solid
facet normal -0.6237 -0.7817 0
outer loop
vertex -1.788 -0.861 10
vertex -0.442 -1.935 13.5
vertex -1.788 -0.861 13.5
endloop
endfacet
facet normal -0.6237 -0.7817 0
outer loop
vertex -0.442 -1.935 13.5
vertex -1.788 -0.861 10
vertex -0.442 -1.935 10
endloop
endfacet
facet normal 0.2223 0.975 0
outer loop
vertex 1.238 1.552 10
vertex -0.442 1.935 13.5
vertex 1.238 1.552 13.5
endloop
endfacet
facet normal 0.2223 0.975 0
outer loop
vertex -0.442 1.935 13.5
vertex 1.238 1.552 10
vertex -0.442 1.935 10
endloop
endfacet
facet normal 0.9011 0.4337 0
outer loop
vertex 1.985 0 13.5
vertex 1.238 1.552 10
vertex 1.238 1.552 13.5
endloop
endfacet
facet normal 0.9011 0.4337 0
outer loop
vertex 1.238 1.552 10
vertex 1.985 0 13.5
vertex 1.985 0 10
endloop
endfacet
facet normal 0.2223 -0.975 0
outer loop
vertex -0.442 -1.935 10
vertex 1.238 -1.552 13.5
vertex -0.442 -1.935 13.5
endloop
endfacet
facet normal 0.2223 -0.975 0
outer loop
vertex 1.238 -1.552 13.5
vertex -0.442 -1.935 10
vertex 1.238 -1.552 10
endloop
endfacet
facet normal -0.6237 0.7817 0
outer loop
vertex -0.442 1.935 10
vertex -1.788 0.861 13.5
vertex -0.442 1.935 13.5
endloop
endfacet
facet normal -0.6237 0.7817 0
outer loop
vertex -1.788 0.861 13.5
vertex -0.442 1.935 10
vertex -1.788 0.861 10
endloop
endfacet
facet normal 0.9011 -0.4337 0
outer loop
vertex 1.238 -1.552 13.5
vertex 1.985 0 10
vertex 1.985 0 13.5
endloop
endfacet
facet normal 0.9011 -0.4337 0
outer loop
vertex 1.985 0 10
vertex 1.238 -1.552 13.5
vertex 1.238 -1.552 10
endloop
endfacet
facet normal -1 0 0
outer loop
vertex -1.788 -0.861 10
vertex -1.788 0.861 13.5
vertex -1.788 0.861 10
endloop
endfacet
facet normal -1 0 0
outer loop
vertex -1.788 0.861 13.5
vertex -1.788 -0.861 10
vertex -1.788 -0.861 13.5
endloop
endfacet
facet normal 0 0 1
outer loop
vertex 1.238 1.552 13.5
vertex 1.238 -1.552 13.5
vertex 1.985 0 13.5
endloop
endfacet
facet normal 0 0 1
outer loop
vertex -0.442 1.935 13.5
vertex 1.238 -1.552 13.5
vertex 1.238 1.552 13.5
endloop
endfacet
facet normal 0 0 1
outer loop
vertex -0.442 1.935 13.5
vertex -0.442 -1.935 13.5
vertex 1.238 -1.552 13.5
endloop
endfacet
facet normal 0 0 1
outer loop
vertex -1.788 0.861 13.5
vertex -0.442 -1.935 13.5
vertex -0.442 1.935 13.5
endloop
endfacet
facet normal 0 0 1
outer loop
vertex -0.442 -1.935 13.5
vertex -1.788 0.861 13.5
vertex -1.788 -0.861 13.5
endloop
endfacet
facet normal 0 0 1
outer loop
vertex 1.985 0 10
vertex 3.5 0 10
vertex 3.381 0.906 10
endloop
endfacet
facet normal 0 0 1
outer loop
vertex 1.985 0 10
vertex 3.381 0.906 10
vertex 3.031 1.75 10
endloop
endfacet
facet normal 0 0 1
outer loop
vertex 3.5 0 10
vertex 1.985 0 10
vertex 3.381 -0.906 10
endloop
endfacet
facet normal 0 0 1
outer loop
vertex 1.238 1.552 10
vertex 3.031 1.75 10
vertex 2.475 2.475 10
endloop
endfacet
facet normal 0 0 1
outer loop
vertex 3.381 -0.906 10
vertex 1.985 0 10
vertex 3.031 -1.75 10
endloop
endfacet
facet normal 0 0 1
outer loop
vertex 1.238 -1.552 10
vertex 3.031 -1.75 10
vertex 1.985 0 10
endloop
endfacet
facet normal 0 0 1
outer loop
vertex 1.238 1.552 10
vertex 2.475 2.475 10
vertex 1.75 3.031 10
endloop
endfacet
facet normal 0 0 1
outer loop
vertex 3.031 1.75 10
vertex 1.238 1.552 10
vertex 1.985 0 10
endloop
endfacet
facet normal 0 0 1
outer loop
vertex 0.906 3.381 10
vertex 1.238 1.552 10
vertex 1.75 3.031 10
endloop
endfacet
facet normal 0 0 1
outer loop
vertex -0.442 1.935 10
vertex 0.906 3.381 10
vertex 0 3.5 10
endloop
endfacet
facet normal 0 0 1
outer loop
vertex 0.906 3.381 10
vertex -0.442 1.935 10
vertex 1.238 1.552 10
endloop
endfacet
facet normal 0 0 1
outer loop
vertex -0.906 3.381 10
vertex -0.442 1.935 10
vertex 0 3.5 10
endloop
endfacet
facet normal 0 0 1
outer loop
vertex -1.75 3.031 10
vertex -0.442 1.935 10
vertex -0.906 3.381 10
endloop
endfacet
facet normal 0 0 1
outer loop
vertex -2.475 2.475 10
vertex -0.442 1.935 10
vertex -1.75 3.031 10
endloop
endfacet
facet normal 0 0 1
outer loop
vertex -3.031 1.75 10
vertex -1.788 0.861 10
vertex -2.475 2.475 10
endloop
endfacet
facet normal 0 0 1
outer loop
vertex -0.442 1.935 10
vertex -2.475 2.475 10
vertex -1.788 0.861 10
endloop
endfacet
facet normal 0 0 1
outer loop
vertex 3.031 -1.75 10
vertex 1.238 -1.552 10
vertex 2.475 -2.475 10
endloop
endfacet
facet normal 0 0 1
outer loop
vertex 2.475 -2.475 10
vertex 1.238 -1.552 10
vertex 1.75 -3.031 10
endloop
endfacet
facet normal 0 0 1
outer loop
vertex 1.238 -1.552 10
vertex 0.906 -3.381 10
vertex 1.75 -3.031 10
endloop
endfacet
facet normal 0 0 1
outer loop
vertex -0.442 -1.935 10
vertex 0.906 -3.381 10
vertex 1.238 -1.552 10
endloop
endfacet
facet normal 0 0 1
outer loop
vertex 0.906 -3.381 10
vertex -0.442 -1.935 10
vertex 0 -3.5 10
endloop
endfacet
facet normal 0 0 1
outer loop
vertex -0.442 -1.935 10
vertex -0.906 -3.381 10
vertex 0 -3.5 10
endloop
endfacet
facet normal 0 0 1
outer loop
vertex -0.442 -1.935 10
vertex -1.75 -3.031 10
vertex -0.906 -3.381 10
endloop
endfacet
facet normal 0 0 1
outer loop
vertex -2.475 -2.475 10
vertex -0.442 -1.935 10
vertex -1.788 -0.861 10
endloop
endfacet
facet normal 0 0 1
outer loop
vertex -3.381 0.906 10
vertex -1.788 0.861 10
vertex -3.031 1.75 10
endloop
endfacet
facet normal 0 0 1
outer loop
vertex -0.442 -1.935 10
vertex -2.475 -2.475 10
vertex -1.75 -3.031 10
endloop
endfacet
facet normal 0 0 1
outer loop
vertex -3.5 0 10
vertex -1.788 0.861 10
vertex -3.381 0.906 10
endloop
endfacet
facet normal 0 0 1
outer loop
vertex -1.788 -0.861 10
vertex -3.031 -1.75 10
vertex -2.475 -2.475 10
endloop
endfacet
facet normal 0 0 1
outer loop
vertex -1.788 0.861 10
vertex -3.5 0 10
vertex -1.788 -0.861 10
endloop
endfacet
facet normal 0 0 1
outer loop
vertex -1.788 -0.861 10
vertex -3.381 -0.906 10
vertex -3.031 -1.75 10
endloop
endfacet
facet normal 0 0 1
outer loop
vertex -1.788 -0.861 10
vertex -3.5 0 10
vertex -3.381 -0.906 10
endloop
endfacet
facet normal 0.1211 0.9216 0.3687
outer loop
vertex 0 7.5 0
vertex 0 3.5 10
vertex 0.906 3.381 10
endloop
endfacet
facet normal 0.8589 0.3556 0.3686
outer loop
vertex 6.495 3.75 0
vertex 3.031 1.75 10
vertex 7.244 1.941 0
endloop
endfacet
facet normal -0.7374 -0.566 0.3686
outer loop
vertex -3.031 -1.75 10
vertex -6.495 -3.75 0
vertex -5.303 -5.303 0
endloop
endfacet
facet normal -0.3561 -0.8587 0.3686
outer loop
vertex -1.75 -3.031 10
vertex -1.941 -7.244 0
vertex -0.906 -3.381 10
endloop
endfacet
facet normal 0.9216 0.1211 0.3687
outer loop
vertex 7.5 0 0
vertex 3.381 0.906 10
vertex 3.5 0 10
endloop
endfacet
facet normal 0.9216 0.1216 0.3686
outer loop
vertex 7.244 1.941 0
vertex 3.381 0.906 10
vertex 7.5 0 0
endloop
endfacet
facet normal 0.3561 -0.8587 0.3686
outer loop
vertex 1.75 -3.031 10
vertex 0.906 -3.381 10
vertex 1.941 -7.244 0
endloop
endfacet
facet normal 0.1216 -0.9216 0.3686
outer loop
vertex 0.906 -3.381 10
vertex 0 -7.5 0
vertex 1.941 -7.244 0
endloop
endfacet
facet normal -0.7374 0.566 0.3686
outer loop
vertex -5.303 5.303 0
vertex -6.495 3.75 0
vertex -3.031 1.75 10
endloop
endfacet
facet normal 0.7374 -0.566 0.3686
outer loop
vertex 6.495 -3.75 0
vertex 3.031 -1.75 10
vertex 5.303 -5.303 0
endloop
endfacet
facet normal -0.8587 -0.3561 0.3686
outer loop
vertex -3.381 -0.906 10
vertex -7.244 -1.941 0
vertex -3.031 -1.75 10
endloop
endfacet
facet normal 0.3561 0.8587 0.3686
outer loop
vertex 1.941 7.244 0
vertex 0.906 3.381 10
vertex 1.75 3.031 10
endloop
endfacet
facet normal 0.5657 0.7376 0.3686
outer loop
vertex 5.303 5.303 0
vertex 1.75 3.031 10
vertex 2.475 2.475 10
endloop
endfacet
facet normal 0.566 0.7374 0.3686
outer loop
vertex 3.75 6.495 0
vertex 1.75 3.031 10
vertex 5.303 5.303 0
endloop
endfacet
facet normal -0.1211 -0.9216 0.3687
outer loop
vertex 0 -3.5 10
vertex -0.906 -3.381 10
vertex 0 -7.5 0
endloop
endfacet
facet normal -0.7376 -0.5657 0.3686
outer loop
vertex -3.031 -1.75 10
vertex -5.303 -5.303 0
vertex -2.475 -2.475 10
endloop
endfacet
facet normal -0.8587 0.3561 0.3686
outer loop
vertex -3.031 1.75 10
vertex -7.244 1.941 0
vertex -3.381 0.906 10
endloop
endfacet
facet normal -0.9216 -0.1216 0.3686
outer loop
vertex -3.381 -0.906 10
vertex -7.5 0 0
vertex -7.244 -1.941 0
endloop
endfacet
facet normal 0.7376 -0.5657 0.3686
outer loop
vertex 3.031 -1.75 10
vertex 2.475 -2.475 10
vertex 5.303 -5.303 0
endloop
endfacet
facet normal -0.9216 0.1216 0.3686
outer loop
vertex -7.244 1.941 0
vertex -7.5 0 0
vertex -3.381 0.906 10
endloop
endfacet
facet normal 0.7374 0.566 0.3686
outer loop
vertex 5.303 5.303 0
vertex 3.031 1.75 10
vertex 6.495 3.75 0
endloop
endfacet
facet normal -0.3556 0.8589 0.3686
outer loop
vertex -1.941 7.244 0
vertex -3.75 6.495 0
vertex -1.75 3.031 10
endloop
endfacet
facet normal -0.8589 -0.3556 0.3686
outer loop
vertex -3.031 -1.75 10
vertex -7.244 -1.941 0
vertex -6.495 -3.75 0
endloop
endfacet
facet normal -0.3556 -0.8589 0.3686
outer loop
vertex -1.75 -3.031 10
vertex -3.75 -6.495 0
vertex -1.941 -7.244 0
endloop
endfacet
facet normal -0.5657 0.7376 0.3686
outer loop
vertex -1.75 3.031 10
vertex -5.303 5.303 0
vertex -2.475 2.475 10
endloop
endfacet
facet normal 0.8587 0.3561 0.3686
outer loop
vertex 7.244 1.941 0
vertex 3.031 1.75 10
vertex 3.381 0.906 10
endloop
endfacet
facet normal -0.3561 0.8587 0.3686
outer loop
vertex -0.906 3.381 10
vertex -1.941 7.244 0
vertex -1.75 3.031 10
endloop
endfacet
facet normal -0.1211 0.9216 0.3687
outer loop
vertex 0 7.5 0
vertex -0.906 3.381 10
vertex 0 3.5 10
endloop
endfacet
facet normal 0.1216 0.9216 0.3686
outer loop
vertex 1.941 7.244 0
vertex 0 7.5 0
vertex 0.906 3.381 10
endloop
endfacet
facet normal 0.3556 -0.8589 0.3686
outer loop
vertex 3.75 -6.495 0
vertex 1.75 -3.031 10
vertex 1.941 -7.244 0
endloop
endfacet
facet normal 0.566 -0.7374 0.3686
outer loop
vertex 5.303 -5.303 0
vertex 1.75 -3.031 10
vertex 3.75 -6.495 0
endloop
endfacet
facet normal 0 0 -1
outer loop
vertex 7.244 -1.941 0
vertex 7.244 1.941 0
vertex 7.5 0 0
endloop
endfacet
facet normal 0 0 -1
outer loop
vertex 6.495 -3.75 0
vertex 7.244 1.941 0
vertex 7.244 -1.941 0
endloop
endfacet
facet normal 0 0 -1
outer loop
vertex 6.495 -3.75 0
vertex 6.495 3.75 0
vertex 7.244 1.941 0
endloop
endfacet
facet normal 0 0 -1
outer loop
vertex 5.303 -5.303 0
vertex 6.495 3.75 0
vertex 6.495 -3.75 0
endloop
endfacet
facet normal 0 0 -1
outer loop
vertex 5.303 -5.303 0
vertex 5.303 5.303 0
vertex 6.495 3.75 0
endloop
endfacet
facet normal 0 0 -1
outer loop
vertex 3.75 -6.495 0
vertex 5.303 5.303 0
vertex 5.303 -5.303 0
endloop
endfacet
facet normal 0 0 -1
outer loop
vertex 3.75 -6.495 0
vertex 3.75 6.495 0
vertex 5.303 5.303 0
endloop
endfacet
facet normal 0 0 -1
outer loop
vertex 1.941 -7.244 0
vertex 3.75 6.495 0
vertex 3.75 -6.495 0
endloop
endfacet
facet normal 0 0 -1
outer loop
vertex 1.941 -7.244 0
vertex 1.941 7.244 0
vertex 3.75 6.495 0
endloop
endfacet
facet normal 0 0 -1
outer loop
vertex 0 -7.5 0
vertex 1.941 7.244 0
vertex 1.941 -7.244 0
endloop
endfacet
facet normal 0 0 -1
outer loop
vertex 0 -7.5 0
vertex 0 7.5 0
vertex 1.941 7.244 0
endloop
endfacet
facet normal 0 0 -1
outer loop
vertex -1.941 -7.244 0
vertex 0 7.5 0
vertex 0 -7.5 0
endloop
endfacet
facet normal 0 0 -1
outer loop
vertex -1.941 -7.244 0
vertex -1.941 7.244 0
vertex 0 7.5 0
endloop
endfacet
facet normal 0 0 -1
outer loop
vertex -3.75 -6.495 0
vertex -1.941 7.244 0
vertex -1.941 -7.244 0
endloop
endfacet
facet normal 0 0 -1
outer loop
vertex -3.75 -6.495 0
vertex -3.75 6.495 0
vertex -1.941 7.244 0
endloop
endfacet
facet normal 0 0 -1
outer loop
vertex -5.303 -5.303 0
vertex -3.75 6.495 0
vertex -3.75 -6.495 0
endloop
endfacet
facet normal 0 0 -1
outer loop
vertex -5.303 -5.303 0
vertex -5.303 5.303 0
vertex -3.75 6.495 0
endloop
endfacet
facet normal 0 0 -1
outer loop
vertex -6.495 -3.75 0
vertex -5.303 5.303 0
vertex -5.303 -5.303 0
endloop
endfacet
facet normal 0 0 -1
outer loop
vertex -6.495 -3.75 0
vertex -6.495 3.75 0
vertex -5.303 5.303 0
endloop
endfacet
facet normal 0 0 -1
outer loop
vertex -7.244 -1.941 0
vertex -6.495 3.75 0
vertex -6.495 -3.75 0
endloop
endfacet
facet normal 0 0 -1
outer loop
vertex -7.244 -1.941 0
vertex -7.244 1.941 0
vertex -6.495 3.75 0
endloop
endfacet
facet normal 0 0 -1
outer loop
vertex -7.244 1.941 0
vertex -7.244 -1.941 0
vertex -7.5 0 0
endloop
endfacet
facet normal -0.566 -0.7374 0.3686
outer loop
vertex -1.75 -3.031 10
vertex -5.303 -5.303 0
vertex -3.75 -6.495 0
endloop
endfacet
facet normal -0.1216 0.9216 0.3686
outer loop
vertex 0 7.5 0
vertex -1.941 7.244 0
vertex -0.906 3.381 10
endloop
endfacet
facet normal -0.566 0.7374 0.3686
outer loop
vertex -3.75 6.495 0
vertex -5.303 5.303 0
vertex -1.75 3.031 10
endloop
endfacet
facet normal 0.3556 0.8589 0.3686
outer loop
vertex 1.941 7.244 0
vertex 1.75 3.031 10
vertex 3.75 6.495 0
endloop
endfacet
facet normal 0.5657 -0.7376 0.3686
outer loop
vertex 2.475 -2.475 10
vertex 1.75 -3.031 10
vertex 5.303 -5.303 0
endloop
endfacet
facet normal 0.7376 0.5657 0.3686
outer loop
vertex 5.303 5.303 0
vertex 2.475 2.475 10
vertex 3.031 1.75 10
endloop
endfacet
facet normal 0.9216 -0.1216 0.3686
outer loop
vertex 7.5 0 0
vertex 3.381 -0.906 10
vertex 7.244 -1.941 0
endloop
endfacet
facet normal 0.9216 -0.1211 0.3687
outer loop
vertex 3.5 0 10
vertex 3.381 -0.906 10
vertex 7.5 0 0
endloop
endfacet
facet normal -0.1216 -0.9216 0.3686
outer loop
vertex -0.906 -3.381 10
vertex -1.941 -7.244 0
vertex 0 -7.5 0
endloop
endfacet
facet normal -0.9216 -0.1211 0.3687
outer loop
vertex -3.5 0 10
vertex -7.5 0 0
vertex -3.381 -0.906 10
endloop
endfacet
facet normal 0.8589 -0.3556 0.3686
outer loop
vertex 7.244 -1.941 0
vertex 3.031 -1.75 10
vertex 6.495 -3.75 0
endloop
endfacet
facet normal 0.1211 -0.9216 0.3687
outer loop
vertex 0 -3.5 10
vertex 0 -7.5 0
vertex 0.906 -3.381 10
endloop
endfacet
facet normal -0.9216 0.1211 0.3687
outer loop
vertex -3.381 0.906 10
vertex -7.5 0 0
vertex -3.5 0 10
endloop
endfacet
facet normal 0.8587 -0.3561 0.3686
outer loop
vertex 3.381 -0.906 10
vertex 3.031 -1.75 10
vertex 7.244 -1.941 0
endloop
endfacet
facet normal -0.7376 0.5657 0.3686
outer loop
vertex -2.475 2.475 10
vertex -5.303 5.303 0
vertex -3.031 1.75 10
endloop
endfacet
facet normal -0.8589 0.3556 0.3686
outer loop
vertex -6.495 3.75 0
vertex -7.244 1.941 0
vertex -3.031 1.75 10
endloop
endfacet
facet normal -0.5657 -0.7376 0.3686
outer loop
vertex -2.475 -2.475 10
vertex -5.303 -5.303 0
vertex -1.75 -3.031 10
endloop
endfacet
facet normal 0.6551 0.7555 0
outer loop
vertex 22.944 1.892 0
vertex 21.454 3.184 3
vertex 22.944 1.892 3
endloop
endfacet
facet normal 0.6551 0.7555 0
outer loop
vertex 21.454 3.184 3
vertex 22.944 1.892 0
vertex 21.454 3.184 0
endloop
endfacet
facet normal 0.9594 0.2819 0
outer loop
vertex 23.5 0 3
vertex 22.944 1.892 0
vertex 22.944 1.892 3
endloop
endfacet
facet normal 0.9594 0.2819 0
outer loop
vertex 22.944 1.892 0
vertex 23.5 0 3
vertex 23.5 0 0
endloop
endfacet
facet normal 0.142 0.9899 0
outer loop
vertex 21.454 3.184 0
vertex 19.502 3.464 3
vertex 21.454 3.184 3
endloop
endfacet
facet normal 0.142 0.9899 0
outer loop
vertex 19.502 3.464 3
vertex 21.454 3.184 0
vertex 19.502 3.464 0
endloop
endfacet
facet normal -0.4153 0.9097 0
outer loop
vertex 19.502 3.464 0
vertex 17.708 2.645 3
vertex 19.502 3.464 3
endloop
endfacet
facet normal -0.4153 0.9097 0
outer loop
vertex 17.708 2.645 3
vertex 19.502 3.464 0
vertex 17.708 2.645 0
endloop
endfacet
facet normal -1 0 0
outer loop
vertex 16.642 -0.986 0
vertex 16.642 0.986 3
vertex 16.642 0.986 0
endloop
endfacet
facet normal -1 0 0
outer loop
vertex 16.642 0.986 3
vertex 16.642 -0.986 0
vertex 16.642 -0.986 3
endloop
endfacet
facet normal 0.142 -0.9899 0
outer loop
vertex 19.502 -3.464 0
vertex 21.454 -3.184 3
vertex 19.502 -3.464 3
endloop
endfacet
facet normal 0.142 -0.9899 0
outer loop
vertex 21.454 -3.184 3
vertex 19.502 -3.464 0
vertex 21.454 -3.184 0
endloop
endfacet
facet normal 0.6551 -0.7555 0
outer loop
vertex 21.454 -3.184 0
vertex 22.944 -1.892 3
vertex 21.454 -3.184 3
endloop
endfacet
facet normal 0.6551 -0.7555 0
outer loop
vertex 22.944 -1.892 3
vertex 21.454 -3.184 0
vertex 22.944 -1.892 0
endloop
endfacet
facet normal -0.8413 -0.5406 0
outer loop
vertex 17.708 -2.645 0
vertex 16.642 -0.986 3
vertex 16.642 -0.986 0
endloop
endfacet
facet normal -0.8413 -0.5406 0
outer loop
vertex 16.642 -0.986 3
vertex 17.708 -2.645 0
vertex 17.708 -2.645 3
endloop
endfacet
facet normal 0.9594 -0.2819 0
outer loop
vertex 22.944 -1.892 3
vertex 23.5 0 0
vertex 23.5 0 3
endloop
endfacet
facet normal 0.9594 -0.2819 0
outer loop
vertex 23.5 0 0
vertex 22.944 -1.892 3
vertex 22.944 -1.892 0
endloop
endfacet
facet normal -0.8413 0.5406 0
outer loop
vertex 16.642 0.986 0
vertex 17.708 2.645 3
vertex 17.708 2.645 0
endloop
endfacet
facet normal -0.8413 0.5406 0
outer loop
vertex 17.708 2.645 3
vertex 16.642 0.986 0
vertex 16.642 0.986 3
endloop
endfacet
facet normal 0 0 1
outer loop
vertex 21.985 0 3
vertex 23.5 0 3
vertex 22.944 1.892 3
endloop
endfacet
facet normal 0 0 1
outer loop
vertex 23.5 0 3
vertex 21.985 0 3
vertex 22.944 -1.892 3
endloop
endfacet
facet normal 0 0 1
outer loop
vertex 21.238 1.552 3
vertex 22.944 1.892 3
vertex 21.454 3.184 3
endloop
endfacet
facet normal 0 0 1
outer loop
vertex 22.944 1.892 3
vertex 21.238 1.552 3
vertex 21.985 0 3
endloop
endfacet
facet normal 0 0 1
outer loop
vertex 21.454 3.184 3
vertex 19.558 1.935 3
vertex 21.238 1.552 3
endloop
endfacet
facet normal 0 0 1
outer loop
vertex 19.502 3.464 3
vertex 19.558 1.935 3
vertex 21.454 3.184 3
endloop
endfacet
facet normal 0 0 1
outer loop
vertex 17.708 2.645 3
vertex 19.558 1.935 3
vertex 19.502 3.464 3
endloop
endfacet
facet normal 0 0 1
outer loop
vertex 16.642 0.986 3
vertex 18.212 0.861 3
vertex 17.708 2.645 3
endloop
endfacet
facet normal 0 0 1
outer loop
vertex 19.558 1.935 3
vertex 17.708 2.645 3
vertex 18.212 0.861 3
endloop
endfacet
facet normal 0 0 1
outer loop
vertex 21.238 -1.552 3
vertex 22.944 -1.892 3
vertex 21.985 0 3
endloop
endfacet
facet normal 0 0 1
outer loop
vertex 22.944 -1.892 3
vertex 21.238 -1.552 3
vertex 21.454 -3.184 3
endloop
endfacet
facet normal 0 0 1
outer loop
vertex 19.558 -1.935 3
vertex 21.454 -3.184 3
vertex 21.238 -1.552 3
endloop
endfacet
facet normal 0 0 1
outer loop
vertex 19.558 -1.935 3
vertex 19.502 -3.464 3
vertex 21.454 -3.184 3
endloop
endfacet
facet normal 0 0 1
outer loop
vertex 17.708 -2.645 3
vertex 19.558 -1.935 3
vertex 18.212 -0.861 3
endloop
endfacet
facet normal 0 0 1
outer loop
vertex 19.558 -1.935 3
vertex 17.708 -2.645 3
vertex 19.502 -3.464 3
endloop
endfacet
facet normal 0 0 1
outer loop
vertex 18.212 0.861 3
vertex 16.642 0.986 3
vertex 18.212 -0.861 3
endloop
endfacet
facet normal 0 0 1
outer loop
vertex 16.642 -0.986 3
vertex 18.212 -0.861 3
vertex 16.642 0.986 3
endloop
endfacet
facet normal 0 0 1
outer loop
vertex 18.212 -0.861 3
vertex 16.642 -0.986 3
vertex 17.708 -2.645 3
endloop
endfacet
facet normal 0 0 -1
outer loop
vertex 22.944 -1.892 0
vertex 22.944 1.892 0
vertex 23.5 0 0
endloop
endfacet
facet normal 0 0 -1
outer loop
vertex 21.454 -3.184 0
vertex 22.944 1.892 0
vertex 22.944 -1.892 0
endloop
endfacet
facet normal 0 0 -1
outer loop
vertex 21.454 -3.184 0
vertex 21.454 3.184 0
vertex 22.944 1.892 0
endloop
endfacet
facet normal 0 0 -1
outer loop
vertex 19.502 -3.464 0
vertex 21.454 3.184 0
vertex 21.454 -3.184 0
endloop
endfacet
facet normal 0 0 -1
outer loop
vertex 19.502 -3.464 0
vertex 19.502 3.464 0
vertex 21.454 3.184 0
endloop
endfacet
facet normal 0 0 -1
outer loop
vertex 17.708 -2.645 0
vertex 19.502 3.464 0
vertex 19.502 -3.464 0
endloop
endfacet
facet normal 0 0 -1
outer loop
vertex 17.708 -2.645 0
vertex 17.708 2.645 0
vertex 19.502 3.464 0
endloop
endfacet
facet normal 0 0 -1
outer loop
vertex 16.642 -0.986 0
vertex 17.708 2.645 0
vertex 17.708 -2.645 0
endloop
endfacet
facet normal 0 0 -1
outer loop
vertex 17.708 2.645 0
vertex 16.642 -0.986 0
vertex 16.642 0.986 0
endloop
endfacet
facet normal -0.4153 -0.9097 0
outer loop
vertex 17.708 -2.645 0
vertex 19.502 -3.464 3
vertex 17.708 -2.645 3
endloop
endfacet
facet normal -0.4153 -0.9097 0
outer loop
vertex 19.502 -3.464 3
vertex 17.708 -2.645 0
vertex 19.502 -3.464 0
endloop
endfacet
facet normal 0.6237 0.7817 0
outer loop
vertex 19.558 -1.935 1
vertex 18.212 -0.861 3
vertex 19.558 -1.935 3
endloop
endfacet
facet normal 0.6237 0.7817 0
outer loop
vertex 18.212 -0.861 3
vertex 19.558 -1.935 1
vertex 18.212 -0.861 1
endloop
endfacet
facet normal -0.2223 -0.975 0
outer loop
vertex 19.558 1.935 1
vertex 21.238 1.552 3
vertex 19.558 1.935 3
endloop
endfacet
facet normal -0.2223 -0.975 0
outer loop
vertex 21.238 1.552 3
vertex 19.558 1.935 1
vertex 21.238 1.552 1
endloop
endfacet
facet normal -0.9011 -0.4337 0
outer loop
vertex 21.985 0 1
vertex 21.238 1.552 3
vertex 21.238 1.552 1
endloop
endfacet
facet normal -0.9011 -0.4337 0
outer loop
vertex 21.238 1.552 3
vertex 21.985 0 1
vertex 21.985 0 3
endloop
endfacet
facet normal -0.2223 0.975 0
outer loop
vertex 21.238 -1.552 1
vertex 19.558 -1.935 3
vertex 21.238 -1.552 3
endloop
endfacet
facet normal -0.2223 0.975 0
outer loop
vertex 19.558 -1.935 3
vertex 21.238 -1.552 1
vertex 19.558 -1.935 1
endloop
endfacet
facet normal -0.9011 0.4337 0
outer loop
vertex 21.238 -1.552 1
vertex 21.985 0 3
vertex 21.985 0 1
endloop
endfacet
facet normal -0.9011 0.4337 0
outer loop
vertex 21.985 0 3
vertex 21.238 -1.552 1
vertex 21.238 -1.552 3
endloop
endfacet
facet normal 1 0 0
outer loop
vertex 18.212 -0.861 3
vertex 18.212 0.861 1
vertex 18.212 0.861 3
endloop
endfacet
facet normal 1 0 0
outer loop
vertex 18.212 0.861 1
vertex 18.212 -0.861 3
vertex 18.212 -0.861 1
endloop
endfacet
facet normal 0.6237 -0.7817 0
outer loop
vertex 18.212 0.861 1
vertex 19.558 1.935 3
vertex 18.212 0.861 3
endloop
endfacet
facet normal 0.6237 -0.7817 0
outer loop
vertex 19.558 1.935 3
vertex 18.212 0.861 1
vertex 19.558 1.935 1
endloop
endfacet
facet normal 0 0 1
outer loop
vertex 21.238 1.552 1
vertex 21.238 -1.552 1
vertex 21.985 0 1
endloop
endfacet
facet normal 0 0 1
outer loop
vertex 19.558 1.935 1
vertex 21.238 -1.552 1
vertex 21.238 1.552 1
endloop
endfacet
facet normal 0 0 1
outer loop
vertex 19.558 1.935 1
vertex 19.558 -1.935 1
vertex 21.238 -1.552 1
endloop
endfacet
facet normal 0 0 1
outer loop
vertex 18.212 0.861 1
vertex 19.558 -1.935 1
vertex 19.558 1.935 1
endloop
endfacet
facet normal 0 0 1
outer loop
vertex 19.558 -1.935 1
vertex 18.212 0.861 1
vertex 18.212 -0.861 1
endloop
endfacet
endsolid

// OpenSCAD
// Customizable PCB foot
// All units in mm

screw_diameter = 3.97;
screw_height = 3.5;
// Must be >= that the screw diameter
base_top_diameter = 7;
// Must be >= that the top diameter
base_bottom_diameter = 15;
base_height = 10;
make_cap = "yes"; // [yes,no]
// Must be < than the screw height
cap_height = 3;
// Must be >= that the base bottom diameter
cap_displacement = 20;

translate([0,0,base_height]) {
  cylinder(h=screw_height, d1=screw_diameter, d2=screw_diameter);
  translate([0,0,-base_height])
    cylinder(h=base_height, d1=base_bottom_diameter, d2=base_top_diameter);
}

if (make_cap == "yes") {
  translate([cap_displacement,0,0])
    difference() {
      cylinder(h=cap_height, d1=base_top_diameter, d2=base_top_diameter);
      translate([0,0,1])
        cylinder(h=screw_height, d1=screw_diameter, d2=screw_diameter);
    }
}
